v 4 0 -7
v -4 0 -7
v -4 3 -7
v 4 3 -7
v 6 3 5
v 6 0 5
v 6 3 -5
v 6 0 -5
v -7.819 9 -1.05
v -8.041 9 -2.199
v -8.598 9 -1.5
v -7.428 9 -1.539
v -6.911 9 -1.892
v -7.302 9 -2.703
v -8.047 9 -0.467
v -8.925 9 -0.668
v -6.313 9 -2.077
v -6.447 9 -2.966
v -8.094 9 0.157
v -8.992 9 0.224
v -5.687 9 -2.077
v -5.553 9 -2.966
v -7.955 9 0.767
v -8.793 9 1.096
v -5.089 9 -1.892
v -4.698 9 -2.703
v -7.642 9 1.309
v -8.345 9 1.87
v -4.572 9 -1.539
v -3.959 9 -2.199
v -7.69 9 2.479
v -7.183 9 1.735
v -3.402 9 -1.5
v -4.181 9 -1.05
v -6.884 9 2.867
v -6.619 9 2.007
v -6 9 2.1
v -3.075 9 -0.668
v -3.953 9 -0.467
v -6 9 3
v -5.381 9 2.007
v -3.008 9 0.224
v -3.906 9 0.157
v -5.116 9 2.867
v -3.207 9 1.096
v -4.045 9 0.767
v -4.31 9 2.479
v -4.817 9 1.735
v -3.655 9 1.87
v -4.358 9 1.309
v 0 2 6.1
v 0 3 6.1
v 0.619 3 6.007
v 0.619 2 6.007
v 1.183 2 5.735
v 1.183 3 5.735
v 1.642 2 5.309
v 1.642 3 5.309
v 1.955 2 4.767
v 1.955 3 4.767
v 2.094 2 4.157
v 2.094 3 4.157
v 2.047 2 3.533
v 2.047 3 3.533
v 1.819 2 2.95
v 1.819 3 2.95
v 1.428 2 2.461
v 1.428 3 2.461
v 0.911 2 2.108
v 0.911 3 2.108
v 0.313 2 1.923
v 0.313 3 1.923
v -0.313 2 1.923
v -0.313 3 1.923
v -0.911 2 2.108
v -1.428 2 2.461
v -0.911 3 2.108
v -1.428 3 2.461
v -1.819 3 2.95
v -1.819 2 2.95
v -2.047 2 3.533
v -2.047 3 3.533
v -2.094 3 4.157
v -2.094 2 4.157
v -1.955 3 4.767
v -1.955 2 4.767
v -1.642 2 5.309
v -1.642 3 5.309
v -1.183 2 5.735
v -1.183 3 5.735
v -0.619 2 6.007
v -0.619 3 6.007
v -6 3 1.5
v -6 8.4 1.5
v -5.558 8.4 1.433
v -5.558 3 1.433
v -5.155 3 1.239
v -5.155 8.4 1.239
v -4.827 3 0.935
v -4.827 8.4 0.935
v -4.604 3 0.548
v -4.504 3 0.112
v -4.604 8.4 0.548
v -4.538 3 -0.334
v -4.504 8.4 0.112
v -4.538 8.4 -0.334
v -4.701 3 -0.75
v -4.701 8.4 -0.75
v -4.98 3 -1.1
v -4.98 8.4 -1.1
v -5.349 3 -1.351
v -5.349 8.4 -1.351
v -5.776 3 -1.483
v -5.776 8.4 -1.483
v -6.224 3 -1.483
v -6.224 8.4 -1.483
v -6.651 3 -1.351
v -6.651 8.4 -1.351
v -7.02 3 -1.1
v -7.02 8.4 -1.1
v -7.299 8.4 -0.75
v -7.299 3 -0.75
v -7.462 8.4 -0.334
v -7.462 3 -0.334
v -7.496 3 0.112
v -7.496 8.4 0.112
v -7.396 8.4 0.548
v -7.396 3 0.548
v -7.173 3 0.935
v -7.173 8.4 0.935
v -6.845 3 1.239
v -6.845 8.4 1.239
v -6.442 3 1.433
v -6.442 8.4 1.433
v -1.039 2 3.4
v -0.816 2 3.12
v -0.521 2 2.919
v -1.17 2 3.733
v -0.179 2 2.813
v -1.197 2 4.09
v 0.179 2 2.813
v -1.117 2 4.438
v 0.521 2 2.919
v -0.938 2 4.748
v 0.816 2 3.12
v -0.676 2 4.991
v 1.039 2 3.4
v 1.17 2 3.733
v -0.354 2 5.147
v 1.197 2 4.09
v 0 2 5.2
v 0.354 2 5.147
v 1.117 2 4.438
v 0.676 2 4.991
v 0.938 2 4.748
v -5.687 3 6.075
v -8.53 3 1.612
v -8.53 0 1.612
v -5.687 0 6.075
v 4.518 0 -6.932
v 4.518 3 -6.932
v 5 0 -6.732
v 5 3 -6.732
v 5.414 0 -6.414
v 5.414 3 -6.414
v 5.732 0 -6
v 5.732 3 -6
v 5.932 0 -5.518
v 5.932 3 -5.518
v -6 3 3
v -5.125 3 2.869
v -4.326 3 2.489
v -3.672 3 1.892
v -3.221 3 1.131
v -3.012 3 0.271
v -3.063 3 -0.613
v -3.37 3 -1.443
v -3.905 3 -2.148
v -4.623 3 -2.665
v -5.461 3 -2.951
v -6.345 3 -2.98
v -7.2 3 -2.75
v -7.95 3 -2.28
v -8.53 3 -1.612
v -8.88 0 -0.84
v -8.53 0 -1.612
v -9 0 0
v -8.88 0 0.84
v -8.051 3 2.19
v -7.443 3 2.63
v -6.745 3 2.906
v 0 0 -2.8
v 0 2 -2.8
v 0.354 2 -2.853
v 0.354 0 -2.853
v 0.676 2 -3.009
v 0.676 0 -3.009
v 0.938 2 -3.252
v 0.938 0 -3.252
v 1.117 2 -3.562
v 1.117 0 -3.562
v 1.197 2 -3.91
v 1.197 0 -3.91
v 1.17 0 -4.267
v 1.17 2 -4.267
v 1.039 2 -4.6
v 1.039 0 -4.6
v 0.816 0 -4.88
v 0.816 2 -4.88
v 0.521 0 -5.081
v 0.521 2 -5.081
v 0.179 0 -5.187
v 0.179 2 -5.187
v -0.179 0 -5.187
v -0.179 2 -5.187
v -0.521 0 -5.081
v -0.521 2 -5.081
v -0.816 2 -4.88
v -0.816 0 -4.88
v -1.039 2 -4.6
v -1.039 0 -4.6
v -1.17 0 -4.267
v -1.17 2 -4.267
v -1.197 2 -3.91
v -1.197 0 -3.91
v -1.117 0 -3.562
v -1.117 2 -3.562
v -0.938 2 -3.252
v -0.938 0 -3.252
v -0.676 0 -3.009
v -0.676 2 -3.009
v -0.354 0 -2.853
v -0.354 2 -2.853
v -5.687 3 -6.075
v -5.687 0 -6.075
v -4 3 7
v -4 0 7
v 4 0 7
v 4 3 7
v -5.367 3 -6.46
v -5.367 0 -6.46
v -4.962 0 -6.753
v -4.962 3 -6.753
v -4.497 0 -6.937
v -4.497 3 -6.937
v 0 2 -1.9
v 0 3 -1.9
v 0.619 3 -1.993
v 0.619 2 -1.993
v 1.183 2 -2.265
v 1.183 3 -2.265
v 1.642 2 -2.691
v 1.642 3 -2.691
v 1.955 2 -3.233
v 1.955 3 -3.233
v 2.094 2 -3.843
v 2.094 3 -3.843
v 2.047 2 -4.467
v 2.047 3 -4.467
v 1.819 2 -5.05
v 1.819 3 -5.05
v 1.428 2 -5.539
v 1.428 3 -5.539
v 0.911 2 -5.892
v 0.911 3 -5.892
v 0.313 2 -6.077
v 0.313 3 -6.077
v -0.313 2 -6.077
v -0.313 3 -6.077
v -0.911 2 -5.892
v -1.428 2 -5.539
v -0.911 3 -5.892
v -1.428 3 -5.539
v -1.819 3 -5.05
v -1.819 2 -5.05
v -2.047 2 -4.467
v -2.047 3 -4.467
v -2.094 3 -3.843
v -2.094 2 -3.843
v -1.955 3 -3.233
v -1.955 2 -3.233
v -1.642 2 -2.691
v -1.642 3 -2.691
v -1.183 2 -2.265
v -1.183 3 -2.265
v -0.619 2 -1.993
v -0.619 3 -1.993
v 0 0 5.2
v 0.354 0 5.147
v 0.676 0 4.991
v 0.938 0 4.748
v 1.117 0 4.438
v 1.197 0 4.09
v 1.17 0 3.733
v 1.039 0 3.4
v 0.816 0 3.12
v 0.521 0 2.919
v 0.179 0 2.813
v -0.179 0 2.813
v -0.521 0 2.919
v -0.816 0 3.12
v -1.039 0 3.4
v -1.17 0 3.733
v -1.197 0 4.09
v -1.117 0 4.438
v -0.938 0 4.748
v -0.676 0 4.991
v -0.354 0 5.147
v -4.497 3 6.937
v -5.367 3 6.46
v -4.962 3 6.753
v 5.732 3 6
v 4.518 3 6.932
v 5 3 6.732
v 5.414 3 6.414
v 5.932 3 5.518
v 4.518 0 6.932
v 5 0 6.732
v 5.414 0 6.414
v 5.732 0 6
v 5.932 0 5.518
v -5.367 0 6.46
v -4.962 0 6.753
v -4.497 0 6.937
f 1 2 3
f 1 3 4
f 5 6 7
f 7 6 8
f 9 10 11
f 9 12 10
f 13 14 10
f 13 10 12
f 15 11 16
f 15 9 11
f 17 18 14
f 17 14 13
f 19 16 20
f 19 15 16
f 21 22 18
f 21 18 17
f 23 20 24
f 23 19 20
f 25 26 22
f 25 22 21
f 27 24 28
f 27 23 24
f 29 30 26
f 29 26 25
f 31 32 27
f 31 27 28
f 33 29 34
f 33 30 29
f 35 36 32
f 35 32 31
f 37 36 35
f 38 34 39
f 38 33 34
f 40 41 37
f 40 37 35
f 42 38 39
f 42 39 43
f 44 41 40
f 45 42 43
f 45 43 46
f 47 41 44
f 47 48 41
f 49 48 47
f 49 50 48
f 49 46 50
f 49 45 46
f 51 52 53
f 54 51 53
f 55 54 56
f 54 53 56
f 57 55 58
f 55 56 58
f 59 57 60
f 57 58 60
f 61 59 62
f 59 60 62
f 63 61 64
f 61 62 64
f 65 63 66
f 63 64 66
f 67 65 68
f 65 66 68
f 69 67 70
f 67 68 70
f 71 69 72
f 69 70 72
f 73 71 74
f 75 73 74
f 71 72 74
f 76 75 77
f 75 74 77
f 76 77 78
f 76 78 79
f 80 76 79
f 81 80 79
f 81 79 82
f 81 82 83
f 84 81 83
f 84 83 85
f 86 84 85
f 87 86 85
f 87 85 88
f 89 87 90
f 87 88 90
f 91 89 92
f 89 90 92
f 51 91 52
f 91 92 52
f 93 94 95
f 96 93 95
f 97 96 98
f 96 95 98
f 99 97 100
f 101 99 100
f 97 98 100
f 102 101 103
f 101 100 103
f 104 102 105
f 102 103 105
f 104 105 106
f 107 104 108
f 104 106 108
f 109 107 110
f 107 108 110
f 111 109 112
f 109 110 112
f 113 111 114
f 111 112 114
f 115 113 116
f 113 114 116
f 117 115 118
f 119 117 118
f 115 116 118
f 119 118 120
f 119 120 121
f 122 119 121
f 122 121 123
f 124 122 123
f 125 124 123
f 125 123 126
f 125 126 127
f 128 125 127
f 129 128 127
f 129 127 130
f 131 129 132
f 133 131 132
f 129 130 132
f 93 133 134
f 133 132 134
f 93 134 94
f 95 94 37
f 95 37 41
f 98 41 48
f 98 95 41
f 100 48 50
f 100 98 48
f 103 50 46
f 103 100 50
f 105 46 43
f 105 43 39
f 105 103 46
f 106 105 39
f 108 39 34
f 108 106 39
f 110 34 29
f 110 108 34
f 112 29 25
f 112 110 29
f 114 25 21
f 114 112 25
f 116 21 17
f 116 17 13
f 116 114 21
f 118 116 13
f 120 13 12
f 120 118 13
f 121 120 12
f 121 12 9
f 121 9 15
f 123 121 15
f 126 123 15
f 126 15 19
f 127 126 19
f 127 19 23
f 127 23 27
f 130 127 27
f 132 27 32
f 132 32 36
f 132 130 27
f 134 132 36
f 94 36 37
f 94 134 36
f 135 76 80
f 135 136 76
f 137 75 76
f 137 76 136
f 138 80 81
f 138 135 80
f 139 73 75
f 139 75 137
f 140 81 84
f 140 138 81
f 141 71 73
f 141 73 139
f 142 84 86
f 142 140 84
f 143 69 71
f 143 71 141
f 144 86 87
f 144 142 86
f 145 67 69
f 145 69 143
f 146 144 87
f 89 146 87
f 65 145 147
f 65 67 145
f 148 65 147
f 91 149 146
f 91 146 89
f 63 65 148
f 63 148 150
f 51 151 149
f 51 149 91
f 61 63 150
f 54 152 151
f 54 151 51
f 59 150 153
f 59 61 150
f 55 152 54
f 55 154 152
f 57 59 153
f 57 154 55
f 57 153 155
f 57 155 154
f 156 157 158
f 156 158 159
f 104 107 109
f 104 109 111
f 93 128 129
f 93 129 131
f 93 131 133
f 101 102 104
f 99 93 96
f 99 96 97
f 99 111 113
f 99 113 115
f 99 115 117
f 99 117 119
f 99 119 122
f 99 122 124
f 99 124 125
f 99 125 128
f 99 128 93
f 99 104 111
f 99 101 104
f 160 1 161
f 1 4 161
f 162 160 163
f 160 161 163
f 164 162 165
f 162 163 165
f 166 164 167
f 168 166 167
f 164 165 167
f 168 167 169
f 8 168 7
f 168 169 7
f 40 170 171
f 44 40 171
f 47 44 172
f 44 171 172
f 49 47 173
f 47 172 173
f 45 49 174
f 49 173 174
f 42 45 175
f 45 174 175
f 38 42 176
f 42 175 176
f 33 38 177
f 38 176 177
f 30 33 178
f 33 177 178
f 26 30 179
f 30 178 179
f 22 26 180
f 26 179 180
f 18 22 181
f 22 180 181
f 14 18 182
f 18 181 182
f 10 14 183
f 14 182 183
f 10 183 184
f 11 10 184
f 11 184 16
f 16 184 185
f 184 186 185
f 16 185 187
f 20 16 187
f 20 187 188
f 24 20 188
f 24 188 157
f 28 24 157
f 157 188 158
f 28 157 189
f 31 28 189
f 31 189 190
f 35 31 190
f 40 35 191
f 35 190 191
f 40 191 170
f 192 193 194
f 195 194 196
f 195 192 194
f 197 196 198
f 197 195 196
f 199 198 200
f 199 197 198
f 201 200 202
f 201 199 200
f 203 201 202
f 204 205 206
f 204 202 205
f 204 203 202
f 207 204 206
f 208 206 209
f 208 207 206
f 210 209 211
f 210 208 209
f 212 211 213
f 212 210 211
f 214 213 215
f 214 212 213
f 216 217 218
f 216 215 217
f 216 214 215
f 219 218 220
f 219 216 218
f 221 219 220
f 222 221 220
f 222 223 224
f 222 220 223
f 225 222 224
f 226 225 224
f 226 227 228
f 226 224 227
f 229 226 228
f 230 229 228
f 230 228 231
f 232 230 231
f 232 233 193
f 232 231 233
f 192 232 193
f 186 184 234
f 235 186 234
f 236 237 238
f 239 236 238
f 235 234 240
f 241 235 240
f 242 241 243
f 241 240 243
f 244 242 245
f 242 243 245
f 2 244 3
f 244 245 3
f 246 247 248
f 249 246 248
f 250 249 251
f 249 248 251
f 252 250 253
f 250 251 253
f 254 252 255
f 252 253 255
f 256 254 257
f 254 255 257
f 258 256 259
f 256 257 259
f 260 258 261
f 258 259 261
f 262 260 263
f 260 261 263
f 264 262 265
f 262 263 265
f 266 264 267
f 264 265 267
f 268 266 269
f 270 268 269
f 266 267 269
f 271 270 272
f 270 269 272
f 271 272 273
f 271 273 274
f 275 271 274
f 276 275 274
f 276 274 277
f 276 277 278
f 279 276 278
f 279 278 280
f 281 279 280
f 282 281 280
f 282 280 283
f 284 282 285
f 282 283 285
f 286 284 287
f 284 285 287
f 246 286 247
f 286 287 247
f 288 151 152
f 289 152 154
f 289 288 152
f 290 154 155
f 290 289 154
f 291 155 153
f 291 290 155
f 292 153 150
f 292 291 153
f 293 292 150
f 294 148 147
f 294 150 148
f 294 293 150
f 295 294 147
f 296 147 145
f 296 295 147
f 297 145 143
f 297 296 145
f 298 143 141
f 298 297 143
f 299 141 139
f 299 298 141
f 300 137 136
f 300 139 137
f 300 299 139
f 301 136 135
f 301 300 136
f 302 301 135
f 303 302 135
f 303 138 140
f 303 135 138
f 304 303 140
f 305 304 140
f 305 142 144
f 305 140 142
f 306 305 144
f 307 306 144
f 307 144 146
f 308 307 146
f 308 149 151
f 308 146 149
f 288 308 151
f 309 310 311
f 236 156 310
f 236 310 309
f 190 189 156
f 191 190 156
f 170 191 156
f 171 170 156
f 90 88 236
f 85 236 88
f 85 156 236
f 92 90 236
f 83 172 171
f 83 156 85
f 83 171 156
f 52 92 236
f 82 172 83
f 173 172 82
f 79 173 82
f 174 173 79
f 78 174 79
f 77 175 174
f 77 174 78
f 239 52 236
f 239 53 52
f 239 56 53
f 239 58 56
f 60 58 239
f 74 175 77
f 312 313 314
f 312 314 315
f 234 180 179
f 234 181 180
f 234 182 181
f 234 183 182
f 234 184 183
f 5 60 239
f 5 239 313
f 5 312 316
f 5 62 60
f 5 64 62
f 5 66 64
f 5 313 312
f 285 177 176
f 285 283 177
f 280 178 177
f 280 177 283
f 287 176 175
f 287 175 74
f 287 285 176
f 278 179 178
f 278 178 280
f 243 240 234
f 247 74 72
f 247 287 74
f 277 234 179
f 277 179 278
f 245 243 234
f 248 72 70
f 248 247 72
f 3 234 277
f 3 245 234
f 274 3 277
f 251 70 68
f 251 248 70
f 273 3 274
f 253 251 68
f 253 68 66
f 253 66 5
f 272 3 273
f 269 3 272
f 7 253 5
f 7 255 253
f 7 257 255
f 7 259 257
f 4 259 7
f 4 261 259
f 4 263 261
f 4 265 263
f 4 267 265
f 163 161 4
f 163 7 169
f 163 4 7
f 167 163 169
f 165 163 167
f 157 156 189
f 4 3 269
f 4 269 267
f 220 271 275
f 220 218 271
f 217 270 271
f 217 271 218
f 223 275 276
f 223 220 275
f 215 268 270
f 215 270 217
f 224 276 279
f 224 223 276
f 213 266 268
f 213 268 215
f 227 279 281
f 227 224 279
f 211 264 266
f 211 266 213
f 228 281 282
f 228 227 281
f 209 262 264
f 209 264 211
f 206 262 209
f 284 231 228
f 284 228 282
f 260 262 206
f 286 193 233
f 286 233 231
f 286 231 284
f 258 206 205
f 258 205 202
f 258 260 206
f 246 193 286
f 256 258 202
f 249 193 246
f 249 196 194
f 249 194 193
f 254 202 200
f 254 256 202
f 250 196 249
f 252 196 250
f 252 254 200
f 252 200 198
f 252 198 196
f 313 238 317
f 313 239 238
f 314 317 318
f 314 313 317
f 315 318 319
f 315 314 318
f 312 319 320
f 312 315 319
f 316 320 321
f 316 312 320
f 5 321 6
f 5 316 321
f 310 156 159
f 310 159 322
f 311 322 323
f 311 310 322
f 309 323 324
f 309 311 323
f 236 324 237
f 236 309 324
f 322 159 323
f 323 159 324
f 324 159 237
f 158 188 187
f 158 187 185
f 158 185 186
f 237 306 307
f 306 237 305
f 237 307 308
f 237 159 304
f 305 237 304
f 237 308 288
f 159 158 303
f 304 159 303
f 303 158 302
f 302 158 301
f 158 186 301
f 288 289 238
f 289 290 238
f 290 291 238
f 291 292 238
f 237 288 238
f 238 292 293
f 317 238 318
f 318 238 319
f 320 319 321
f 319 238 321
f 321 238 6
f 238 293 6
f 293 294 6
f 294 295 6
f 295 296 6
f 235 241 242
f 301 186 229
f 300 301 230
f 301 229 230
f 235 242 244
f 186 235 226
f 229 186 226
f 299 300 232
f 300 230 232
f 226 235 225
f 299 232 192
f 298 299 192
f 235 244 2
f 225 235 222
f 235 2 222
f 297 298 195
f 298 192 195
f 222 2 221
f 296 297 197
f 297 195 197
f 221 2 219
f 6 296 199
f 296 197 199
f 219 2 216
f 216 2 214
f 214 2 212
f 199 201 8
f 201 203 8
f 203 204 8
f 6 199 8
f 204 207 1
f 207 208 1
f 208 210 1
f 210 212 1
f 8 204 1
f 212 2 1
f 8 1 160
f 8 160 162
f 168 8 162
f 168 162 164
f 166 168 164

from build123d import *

# Parameters (mm, degrees)
SKETCH1_W                       = 12
SKETCH1_H                       = 14
SKETCH1_R                       = 1.2
BOSS_EXTRUDE1_DEPTH             = 3
SKETCH3_R                       = 3
BOSS_EXTRUDE2_DEPTH             = 6
BOSS_EXTRUDE2_DIRECTION_2_REACH = 11.695
FILLET1_R                       = 2
BOSS_EXTRUDE3_DEPTH             = 3
SKETCH6_R                       = 2.1
CUT_EXTRUDE2_DEPTH              = 1
SKETCH10_R                      = 1.5
CUT_EXTRUDE3_DEPTH              = 6
CHAMFER1_SIZE                   = 0.6


with BuildPart() as part:
    # Sketch1 → Boss-Extrude1 (new body)
    with BuildSketch(Plane(origin=(0, 0, 0), x_dir=(1, 0, 0), z_dir=(0, 1, 0))):
        Rectangle(SKETCH1_W, SKETCH1_H)
        with Locations(Location((0, 4, 0), (0, 0, 270))):
            Circle(SKETCH1_R, mode=Mode.SUBTRACT)
        with Locations(Location((0, -4, 0), (0, 0, 270))):
            Circle(SKETCH1_R, mode=Mode.SUBTRACT)
    extrude(amount=BOSS_EXTRUDE1_DEPTH)

    # Sketch3 → Boss-Extrude2 (add)
    with BuildSketch(Plane(origin=(0, 3, 0), x_dir=(1, 0, 0), z_dir=(0, 1, 0))):
        with Locations(Location((-6, 0, 0), (0, 0, 270))):
            Circle(SKETCH3_R)
    extrude(amount=BOSS_EXTRUDE2_DEPTH)

    # Boss-Extrude2 direction 2: up to this face of the body (flat: up to its plane)
    boss_extrude2_direction_2_end = Plane(part.part.faces().sort_by_distance((0, 0, 0))[0])
    # Sketch3 → Boss-Extrude2 direction 2 (add, up to the picked face)
    with BuildSketch(Plane(origin=(0, 3, 0), x_dir=(1, 0, 0), z_dir=(0, 1, 0)), mode=Mode.PRIVATE) as boss_extrude2_direction_2_sk1:
        with Locations(Location((-6, 0, 0), (0, 0, 270))):
            Circle(SKETCH3_R)
    boss_extrude2_direction_2_tool1 = split(extrude(boss_extrude2_direction_2_sk1.sketch, amount=-BOSS_EXTRUDE2_DIRECTION_2_REACH, mode=Mode.PRIVATE), bisect_by=boss_extrude2_direction_2_end, keep=Keep.BOTH, mode=Mode.PRIVATE)
    add(boss_extrude2_direction_2_tool1.solids().sort_by(Axis((-6, 3, 0), (0, -1, 0)))[0])

    # Fillet1
    fillet1_edges = [part.edges().sort_by_distance(p)[0] for p in [
        (6, 1.5, 7),
        (-6, 1.5, 7),
        (-6, 1.5, -7),
        (6, 1.5, -7),
    ]]
    fillet(fillet1_edges, radius=FILLET1_R)

    # Sketch5 → Boss-Extrude3 (add)
    with BuildSketch(Plane(origin=(0, 3, 0), x_dir=(1, 0, 0), z_dir=(0, 1, 0))):
        with BuildLine():
            Line((-8.530087563, 1.612035025), (-5.686725042, 6.074690017))
            ThreePointArc((-5.686725042, 6.074690017), (-5.920084645, 5.559709709), (-6, 5))
            Line((-6, 5), (-6, 3))
            ThreePointArc((-6, 3), (-7.442895513, 2.630219105), (-8.530087563, 1.612035025))
        make_face()
        with BuildLine():
            Line((-8.530087563, -1.612035025), (-5.686725042, -6.074690017))
            ThreePointArc((-5.686725042, -6.074690017), (-5.920084645, -5.559709709), (-6, -5))
            Line((-6, -5), (-6, -3))
            ThreePointArc((-6, -3), (-7.442895513, -2.630219105), (-8.530087563, -1.612035025))
        make_face()
    extrude(amount=-BOSS_EXTRUDE3_DEPTH)

    # Sketch6 → Cut-Extrude2 (cut)
    with BuildSketch(Plane(origin=(0, 3, 0), x_dir=(1, 0, 0), z_dir=(0, 1, 0))):
        with Locations(Location((0, 4, 0), (0, 0, 270))):
            Circle(SKETCH6_R)
        with Locations(Location((0, -4, 0), (0, 0, 270))):
            Circle(SKETCH6_R)
    extrude(amount=-CUT_EXTRUDE2_DEPTH, mode=Mode.SUBTRACT)

    # Sketch10 → Cut-Extrude3 (cut)
    with BuildSketch(Plane(origin=(0, 9, 0), x_dir=(1, 0, 0), z_dir=(0, 1, 0))):
        with Locations(Location((-6, 0, 0), (0, 0, 270))):
            Circle(SKETCH10_R)
    extrude(amount=-CUT_EXTRUDE3_DEPTH, mode=Mode.SUBTRACT)

    # Chamfer1
    chamfer1_edges = [part.edges().sort_by_distance(p)[0] for p in [
        (-6, 9, -1.5),
    ]]
    chamfer(chamfer1_edges, length=CHAMFER1_SIZE)


solid = part.part
